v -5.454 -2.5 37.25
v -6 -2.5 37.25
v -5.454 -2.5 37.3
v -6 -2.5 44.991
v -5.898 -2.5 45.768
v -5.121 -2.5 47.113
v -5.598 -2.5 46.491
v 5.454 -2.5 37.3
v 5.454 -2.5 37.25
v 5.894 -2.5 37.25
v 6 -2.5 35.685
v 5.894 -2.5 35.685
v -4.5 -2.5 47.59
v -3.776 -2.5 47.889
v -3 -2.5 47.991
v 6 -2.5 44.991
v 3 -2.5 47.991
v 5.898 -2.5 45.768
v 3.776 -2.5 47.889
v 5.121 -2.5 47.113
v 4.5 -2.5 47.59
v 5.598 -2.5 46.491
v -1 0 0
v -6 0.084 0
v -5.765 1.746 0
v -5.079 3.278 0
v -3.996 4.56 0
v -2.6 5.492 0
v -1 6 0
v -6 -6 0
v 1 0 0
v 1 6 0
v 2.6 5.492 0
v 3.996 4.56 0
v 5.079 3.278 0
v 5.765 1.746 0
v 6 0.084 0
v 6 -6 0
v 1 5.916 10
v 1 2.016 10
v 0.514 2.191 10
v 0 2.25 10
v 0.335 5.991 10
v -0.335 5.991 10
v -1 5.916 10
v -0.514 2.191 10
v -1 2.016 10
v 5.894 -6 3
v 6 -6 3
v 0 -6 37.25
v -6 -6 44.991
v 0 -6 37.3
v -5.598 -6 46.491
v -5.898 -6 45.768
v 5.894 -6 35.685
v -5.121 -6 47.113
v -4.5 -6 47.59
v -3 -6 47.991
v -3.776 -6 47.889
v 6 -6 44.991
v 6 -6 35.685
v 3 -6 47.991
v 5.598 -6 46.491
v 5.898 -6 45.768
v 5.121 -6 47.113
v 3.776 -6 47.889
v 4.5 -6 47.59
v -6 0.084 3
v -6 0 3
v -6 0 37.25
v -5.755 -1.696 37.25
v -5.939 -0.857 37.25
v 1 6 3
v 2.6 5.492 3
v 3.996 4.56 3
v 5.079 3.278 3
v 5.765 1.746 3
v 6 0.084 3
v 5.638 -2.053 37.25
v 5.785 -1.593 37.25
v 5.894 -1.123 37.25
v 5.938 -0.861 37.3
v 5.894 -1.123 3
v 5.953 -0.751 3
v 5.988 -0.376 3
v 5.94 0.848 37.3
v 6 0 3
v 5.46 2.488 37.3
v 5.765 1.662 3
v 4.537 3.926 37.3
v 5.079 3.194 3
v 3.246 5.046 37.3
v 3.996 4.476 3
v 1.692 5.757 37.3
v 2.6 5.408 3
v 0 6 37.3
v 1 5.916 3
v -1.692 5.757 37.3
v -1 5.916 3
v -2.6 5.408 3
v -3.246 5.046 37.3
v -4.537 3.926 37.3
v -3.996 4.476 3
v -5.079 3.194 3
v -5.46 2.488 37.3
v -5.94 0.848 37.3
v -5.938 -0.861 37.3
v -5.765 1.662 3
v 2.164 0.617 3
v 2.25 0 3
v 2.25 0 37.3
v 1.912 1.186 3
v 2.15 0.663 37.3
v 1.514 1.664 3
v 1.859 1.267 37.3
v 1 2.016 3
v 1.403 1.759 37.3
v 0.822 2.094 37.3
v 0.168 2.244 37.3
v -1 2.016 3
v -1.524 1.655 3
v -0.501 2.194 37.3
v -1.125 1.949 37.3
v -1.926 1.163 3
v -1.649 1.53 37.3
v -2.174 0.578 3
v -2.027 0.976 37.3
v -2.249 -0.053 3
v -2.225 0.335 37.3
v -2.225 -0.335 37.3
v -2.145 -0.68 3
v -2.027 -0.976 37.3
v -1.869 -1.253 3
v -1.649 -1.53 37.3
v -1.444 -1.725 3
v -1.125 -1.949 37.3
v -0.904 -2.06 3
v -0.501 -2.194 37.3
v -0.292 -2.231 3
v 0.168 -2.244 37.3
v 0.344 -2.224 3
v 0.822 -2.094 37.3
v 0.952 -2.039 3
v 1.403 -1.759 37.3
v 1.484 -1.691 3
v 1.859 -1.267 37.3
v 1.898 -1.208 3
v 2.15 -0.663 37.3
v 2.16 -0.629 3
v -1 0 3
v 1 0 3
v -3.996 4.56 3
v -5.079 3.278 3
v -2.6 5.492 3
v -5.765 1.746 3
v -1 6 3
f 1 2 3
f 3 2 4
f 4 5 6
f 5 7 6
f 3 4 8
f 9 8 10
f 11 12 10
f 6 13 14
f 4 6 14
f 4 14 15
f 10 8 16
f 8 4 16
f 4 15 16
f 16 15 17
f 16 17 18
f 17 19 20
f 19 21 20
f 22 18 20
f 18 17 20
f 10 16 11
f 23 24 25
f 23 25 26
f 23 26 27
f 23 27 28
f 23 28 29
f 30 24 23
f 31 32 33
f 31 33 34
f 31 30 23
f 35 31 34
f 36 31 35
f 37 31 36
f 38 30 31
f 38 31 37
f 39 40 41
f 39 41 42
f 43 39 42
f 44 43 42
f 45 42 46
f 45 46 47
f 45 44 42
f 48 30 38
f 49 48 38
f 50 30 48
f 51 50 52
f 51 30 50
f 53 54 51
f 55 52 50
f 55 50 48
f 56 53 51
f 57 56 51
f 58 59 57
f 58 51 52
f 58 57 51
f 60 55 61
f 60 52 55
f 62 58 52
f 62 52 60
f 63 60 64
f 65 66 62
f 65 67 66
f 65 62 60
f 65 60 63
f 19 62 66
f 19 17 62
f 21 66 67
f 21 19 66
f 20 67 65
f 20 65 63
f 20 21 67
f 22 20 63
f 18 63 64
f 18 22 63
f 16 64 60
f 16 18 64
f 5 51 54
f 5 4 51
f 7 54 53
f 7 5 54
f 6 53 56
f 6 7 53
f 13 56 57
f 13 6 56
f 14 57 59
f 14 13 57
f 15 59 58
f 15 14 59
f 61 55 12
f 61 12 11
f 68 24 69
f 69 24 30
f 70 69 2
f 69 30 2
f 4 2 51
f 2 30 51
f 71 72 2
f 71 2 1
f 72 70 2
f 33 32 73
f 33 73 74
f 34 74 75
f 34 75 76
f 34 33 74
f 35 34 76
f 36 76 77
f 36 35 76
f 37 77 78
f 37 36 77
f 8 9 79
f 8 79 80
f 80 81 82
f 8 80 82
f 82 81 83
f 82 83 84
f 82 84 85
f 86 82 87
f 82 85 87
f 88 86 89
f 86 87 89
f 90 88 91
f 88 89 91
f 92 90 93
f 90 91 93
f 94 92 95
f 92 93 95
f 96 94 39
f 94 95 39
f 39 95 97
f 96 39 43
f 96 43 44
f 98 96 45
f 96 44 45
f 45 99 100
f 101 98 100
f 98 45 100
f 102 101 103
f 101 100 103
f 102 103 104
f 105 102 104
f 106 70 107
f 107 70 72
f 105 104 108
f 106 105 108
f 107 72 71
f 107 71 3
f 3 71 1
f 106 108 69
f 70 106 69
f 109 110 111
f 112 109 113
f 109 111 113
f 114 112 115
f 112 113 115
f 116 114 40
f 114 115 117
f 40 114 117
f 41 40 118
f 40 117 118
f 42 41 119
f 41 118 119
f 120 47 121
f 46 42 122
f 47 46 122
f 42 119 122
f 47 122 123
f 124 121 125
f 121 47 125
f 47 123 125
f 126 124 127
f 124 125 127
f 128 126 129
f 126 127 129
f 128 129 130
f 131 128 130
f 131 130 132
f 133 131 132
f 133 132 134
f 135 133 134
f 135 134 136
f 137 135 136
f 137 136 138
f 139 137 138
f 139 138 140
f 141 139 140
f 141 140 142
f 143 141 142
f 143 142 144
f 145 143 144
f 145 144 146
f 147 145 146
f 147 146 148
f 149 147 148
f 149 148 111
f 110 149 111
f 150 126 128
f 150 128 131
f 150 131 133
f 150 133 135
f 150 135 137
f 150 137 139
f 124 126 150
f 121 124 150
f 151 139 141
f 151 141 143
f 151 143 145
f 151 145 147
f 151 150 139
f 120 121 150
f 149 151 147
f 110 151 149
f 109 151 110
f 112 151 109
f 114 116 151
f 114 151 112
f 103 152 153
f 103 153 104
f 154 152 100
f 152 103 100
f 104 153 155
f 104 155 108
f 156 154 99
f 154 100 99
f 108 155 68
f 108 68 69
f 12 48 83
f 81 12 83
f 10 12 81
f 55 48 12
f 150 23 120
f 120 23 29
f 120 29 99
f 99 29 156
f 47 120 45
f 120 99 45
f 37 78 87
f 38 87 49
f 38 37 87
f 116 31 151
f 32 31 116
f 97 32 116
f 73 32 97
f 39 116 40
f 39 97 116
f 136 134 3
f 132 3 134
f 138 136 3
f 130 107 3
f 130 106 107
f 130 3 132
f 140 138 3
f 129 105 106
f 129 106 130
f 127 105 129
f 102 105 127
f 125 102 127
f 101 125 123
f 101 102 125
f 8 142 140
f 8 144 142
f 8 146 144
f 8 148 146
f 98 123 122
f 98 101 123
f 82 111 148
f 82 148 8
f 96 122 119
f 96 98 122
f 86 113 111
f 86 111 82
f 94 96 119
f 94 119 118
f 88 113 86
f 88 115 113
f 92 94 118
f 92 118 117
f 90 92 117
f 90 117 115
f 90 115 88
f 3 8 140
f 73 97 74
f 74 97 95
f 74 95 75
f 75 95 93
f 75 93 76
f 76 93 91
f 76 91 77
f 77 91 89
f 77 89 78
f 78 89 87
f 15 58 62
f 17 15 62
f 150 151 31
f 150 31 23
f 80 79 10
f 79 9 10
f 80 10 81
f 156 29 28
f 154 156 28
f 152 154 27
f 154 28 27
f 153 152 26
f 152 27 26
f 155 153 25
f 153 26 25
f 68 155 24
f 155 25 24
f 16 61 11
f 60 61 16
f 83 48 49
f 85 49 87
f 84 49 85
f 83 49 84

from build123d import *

# Parameters (mm, degrees)
F0_R        = 6
F1_DEPTH    = 37.3
F2_W        = 12
F2_H        = 12
F3_DEPTH    = 3
F4_W        = 12
F4_H        = 12.3061701586
F5_DEPTH    = 3.5
F6_W        = 2
F6_H        = 10
F7_DEPTH    = 6
F8_T1_DEPTH = 32.5803989155
F9_W        = 11.8940497642
F9_H        = 34.25
F10_DEPTH   = 6
F11_R       = 2.25
F12_DEPTH   = 34.3
F13_R       = 3


# Not quite as in the source:
# - a fillet or chamfer that OpenCascade refuses, or shapes differently, is made with other operations: its cross-section is extruded or revolved along the edge and cut away or added


with BuildPart() as f1:
    # F0 (on Top) → F1 (new body)
    with BuildSketch(Plane.XY):
        Circle(F0_R)
    extrude(amount=F1_DEPTH)

    # F2 (on face) → F3 (join)
    with BuildSketch(Plane(origin=(0, 0, 0), x_dir=(1, 0, 0), z_dir=(0, 0, -1))):
        Rectangle(F2_W, F2_H)
    extrude(amount=-F3_DEPTH)

    # F4 (on face) → F5 (join)
    with BuildSketch(Plane.XZ.offset(6)):
        with Locations((0, 41.8383553624)):
            Rectangle(F4_W, F4_H)
    extrude(amount=-F5_DEPTH)

    # F6 (on face) → F7 (cut)
    with BuildSketch(Plane(origin=(0, 6, 0), x_dir=(-1, 0, 0), z_dir=(0, 1, 0))):
        with Locations((0, 5)):
            Rectangle(F6_W, F6_H)
    extrude(amount=-F7_DEPTH, mode=Mode.SUBTRACT)

    # F8: fillet of radius 6 on 2 edges, made by hand

    # F8_s2 → F8_t1 (cut)
    with BuildSketch(Plane.XY.offset(-14.7901994578)):
        with BuildLine():
            ThreePointArc((-1, 6), (-4.582575695, 3.9569035631), (-6, 0.0839202169))
            Line((-6, 0.0839202169), (-6, 6))
            Line((-6, 6), (-1, 6))
        make_face()
        with BuildLine():
            ThreePointArc((1, 6), (4.582575695, 3.9569035631), (6, 0.0839202169))
            Line((6, 0.0839202169), (6, 6))
            Line((6, 6), (1, 6))
        make_face()
    extrude(amount=F8_T1_DEPTH, mode=Mode.SUBTRACT)

    # F9 (on face) → F10 (join)
    with BuildSketch(Plane.XZ.offset(6)):
        with Locations((-0.0529751179, 20.125)):
            Rectangle(F9_W, F9_H)
    extrude(amount=-F10_DEPTH)

    # F11 (on face) → F12 (cut)
    with BuildSketch(Plane.XY.offset(37.3)):
        Circle(F11_R)
    extrude(amount=-F12_DEPTH, mode=Mode.SUBTRACT)

    # F13
    f13_edges = [f1.edges().sort_by_distance(p)[0] for p in [
        (6, -4.25, 47.99144),
        (-6, -4.25, 47.99144),
    ]]
    fillet(f13_edges, radius=F13_R)


solid = f1.part
